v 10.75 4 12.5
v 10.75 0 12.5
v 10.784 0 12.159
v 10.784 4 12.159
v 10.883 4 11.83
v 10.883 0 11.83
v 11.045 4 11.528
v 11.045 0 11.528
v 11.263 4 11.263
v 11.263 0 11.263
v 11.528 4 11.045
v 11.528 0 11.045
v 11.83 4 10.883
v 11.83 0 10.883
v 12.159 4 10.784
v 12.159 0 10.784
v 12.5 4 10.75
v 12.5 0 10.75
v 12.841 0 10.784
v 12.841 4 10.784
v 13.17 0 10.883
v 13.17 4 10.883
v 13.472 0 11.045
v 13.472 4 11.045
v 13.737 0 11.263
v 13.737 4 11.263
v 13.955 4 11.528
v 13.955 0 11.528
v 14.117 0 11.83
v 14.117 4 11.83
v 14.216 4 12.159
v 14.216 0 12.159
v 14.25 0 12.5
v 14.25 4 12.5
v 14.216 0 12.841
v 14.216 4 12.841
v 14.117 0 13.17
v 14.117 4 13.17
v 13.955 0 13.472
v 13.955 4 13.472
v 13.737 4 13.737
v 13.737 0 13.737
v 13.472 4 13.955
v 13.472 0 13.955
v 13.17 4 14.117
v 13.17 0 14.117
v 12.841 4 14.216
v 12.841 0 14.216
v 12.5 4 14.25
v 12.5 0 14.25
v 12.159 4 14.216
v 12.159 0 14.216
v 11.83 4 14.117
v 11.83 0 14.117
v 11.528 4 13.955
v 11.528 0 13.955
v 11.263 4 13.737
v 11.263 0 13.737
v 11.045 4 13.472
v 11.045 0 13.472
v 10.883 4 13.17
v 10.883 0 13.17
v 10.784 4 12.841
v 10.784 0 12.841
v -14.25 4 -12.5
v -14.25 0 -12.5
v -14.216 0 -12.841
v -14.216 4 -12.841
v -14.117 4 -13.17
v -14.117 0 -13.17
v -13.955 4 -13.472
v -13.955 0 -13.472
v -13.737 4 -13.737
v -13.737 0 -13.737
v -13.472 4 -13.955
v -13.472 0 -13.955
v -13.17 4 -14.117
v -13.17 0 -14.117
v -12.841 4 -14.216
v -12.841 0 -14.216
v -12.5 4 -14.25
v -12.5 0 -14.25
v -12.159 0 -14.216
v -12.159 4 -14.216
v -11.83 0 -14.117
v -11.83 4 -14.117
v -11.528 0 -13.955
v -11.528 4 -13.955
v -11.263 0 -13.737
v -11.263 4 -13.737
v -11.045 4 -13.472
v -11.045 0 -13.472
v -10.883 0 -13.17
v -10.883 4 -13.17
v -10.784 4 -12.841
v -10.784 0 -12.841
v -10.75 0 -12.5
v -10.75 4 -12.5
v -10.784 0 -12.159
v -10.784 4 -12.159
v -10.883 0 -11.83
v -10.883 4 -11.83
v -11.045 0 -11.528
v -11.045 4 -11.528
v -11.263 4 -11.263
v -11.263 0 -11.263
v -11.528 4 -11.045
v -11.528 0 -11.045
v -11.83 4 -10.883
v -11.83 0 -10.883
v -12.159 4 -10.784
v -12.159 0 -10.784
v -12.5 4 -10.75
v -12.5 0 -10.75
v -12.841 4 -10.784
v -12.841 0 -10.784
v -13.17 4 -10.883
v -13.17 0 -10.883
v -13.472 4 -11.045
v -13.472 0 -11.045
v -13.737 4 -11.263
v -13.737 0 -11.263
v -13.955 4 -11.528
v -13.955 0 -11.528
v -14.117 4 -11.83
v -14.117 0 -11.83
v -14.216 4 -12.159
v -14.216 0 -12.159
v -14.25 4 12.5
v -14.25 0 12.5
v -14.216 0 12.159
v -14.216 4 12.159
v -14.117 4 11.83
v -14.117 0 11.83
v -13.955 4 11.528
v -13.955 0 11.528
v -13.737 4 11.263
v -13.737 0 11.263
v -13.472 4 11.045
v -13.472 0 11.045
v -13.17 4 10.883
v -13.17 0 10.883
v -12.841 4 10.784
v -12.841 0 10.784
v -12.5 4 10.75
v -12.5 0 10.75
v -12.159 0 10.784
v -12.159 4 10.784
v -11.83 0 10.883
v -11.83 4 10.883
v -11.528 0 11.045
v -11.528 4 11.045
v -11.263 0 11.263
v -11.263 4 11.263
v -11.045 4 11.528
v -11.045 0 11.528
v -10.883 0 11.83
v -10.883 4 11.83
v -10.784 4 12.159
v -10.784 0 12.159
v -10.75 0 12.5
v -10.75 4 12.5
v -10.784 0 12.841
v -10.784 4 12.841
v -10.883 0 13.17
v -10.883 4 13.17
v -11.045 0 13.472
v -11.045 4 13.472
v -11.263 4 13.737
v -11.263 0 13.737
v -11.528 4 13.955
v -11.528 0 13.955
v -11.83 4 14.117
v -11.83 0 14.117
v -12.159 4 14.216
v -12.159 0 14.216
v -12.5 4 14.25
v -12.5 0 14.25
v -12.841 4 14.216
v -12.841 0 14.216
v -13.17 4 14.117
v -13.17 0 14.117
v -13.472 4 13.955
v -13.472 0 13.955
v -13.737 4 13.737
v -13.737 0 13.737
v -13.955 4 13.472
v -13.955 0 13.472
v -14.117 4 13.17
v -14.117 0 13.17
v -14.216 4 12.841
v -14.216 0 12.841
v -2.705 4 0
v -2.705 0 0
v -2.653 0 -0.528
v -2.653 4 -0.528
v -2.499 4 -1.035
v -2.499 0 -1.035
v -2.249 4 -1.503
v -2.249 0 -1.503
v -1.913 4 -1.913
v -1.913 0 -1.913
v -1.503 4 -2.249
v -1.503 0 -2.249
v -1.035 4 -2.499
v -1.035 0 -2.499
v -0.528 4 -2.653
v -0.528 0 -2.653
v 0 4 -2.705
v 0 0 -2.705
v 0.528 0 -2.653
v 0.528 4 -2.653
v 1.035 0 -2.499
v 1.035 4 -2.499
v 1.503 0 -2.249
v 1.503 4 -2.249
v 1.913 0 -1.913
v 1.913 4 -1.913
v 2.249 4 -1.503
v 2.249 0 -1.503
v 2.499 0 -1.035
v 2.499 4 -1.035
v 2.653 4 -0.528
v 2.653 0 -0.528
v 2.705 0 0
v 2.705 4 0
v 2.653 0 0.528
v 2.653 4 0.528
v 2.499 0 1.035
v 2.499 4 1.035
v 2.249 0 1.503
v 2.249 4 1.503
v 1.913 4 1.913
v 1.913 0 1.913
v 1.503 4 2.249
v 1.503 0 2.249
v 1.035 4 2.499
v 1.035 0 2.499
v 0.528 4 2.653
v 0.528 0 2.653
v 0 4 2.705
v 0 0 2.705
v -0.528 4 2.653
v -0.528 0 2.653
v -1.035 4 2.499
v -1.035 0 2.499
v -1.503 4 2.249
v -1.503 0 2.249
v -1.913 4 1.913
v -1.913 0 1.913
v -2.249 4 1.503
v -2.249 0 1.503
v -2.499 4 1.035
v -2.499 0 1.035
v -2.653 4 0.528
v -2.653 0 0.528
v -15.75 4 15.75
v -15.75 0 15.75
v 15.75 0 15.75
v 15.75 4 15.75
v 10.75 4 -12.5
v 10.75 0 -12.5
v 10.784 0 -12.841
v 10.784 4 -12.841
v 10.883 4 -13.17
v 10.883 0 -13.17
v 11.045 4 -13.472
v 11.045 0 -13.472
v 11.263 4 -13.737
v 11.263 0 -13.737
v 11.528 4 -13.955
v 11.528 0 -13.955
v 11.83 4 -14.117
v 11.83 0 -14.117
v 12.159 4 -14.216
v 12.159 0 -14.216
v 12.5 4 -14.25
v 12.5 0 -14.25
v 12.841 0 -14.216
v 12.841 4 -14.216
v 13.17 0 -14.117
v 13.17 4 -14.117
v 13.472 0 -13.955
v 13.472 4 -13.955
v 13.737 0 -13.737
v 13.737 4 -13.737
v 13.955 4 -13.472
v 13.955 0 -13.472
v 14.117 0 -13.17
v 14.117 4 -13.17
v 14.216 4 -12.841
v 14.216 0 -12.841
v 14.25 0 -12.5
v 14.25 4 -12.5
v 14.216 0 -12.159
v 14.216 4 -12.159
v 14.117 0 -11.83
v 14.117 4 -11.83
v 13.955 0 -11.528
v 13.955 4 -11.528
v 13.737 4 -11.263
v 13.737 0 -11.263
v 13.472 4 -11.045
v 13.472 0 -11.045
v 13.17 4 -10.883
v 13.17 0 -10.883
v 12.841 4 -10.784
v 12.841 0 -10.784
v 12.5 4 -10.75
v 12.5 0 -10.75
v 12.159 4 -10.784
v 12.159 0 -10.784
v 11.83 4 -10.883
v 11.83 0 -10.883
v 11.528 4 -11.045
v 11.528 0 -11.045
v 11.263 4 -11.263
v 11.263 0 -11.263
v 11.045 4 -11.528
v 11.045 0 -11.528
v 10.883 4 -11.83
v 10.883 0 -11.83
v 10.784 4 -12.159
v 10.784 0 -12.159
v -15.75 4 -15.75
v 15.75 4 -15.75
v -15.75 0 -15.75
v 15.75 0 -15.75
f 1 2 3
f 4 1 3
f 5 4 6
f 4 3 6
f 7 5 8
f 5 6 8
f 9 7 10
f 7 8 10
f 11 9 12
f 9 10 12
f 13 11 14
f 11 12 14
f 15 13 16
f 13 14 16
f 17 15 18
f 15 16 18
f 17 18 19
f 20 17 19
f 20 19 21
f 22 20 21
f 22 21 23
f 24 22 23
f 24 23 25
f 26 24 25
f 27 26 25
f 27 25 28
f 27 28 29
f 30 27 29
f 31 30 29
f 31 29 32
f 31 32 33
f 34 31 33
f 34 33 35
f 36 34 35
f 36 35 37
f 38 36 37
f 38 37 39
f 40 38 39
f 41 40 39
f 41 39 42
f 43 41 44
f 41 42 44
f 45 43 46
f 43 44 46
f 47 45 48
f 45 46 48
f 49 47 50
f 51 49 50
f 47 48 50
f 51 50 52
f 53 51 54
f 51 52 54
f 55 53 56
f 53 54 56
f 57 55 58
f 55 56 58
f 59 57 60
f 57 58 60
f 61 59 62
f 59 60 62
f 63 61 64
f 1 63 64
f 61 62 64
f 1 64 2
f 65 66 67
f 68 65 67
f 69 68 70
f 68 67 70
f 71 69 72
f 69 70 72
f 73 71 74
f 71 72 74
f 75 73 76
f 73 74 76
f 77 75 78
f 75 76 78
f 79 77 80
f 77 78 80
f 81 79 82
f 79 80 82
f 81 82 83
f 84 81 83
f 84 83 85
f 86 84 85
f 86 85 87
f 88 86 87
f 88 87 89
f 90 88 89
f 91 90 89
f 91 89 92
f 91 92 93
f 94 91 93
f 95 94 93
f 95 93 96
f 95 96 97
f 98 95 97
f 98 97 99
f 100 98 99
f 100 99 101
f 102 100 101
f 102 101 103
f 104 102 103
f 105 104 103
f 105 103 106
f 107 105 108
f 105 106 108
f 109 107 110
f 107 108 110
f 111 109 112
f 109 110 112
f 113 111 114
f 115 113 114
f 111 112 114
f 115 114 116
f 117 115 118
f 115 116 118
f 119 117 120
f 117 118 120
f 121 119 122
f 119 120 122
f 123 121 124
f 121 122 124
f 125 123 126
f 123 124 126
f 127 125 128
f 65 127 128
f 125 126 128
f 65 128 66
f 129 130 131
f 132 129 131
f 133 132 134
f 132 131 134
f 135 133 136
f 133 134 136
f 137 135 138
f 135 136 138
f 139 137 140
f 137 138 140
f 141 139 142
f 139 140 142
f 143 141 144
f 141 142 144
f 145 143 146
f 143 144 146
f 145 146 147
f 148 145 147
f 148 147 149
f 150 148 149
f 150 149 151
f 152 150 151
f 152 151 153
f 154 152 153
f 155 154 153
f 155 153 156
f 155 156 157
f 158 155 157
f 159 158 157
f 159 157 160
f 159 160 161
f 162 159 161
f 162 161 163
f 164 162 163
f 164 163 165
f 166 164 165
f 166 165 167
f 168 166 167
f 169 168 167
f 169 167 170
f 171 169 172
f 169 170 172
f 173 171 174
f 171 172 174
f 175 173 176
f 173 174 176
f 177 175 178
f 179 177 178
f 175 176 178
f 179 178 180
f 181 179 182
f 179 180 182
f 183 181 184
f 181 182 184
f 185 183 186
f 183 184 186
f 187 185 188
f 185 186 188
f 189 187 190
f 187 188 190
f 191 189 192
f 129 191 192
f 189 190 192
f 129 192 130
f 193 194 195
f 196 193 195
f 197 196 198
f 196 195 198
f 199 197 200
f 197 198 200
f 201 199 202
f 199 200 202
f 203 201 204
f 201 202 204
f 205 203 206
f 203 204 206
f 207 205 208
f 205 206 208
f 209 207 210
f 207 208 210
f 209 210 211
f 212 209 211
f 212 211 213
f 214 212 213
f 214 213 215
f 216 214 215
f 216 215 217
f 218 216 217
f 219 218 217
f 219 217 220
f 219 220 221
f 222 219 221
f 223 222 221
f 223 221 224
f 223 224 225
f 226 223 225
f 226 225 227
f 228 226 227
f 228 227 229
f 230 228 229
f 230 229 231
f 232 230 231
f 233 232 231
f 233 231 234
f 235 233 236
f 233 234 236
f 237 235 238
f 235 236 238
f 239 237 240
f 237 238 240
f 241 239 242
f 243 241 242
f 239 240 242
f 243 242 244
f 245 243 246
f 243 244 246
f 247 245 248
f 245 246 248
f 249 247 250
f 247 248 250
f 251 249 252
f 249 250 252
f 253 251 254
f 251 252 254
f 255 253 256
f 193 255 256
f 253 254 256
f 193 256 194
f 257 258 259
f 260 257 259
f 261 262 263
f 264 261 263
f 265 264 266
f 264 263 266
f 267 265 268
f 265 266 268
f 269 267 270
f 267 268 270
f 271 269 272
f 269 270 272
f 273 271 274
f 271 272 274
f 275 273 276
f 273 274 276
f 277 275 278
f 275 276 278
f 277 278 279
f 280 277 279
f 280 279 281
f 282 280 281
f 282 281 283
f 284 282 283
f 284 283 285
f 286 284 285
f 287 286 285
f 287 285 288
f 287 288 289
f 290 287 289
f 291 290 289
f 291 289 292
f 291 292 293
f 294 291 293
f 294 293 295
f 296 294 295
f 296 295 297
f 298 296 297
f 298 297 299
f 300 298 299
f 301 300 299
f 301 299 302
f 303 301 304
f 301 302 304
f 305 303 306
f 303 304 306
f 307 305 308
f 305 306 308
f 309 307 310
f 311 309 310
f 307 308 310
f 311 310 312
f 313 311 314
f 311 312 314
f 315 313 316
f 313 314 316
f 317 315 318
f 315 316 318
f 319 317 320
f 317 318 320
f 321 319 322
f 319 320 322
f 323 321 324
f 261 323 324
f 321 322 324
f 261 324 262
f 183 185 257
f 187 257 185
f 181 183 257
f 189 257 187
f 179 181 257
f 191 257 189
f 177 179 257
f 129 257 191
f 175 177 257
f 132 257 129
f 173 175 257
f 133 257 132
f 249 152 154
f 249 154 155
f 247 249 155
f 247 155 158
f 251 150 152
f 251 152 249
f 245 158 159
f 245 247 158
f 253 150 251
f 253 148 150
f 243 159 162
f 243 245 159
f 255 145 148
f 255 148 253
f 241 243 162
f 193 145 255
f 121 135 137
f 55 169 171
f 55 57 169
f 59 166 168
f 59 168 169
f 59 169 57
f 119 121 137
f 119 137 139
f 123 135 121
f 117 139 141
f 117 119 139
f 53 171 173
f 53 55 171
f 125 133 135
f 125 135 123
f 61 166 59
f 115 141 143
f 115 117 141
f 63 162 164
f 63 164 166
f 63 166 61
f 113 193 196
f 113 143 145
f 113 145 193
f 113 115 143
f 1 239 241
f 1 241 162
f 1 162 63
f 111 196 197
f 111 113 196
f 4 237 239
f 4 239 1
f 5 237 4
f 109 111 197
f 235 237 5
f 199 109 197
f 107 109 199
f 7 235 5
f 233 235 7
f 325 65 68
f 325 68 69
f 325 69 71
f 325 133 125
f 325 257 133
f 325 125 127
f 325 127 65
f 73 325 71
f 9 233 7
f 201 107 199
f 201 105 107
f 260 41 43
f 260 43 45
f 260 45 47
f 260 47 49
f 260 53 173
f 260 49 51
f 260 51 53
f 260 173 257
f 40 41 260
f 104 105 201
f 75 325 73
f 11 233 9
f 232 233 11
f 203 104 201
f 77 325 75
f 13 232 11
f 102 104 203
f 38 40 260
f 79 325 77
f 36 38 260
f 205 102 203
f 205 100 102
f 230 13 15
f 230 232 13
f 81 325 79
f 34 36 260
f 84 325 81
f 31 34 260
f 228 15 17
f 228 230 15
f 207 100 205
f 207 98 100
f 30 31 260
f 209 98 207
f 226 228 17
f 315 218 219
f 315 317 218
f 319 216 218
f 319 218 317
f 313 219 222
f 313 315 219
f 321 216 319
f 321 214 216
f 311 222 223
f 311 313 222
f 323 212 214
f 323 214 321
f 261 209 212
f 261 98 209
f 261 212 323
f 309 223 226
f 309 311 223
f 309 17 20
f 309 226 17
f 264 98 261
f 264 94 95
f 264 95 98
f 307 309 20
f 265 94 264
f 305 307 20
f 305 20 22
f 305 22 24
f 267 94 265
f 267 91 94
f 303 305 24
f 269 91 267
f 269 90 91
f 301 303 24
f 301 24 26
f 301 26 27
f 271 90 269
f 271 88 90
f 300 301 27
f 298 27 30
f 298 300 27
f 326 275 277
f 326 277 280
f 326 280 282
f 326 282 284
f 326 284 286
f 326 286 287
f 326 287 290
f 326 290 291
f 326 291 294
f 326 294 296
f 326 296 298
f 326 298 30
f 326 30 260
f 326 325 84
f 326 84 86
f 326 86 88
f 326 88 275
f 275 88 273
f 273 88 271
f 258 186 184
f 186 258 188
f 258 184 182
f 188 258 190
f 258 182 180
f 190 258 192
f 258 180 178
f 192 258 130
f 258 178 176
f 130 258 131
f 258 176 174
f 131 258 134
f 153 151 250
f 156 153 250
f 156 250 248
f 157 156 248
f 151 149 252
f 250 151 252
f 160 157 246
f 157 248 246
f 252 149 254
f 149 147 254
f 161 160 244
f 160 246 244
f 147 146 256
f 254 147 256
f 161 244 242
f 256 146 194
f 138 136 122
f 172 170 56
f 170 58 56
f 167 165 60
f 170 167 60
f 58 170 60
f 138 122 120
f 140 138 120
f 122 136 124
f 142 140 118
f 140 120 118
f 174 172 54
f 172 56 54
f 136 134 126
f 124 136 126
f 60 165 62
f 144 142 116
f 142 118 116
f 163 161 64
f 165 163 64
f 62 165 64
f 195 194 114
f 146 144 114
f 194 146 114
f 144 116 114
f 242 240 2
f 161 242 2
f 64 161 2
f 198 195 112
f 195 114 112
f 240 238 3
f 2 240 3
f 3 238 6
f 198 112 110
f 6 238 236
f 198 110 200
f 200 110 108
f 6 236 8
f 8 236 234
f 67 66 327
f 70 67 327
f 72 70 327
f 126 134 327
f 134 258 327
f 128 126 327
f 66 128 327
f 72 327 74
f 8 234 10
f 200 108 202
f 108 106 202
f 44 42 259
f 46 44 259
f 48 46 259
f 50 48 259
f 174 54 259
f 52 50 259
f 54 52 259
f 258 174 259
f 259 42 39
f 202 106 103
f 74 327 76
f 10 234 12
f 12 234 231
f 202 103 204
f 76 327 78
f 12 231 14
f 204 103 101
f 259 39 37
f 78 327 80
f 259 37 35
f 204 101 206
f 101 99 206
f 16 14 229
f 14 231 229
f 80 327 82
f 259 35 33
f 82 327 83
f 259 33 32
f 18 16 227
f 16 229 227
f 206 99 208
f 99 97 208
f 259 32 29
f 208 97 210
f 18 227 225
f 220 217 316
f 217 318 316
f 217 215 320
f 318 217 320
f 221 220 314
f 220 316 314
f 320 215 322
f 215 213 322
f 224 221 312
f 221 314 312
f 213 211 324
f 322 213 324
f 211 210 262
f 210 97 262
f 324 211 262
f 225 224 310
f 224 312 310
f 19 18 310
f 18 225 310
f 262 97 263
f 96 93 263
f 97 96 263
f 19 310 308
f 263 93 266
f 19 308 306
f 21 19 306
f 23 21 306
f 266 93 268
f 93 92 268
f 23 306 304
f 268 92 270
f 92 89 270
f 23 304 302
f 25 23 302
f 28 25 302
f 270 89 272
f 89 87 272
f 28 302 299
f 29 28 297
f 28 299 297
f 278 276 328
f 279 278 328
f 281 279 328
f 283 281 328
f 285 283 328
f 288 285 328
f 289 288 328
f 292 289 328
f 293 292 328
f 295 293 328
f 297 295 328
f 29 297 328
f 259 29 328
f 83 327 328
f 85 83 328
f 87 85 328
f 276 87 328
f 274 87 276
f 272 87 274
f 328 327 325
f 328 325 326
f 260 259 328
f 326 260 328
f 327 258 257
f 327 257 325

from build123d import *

# Parameters (mm, degrees)
SKETCH1_W                  = 31.5
SKETCH1_H                  = 31.5
BOSS_EXTRUDE1_DEPTH        = 4
F_3_5_3_5_DIAMETER_HOLE1_D = 3.5
F_1_4_28_TAPPED_HOLE1_D    = 5.4102


with BuildPart() as part:
    # Sketch1 → Boss-Extrude1 (new body)
    with BuildSketch(Plane(origin=(0, 0, 0), x_dir=(1, 0, 0), z_dir=(0, 1, 0))):
        Rectangle(SKETCH1_W, SKETCH1_H)
    extrude(amount=BOSS_EXTRUDE1_DEPTH)

    # Ø3.5 (3.5) Diameter Hole1 (through all)
    with Locations(Plane(origin=(0, 4, 0), x_dir=(1, 0, 0), z_dir=(0, 1, 0))):
        with Locations((-12.5, 12.5), (12.5, 12.5), (12.5, -12.5), (-12.5, -12.5)):
            Hole(F_3_5_3_5_DIAMETER_HOLE1_D / 2)

    # 1/4-28 Tapped Hole1 (through all)
    with Locations(Plane(origin=(0, 4, 0), x_dir=(1, 0, 0), z_dir=(0, 1, 0))):
        with Locations((0, 0)):
            Hole(F_1_4_28_TAPPED_HOLE1_D / 2)


solid = part.part
